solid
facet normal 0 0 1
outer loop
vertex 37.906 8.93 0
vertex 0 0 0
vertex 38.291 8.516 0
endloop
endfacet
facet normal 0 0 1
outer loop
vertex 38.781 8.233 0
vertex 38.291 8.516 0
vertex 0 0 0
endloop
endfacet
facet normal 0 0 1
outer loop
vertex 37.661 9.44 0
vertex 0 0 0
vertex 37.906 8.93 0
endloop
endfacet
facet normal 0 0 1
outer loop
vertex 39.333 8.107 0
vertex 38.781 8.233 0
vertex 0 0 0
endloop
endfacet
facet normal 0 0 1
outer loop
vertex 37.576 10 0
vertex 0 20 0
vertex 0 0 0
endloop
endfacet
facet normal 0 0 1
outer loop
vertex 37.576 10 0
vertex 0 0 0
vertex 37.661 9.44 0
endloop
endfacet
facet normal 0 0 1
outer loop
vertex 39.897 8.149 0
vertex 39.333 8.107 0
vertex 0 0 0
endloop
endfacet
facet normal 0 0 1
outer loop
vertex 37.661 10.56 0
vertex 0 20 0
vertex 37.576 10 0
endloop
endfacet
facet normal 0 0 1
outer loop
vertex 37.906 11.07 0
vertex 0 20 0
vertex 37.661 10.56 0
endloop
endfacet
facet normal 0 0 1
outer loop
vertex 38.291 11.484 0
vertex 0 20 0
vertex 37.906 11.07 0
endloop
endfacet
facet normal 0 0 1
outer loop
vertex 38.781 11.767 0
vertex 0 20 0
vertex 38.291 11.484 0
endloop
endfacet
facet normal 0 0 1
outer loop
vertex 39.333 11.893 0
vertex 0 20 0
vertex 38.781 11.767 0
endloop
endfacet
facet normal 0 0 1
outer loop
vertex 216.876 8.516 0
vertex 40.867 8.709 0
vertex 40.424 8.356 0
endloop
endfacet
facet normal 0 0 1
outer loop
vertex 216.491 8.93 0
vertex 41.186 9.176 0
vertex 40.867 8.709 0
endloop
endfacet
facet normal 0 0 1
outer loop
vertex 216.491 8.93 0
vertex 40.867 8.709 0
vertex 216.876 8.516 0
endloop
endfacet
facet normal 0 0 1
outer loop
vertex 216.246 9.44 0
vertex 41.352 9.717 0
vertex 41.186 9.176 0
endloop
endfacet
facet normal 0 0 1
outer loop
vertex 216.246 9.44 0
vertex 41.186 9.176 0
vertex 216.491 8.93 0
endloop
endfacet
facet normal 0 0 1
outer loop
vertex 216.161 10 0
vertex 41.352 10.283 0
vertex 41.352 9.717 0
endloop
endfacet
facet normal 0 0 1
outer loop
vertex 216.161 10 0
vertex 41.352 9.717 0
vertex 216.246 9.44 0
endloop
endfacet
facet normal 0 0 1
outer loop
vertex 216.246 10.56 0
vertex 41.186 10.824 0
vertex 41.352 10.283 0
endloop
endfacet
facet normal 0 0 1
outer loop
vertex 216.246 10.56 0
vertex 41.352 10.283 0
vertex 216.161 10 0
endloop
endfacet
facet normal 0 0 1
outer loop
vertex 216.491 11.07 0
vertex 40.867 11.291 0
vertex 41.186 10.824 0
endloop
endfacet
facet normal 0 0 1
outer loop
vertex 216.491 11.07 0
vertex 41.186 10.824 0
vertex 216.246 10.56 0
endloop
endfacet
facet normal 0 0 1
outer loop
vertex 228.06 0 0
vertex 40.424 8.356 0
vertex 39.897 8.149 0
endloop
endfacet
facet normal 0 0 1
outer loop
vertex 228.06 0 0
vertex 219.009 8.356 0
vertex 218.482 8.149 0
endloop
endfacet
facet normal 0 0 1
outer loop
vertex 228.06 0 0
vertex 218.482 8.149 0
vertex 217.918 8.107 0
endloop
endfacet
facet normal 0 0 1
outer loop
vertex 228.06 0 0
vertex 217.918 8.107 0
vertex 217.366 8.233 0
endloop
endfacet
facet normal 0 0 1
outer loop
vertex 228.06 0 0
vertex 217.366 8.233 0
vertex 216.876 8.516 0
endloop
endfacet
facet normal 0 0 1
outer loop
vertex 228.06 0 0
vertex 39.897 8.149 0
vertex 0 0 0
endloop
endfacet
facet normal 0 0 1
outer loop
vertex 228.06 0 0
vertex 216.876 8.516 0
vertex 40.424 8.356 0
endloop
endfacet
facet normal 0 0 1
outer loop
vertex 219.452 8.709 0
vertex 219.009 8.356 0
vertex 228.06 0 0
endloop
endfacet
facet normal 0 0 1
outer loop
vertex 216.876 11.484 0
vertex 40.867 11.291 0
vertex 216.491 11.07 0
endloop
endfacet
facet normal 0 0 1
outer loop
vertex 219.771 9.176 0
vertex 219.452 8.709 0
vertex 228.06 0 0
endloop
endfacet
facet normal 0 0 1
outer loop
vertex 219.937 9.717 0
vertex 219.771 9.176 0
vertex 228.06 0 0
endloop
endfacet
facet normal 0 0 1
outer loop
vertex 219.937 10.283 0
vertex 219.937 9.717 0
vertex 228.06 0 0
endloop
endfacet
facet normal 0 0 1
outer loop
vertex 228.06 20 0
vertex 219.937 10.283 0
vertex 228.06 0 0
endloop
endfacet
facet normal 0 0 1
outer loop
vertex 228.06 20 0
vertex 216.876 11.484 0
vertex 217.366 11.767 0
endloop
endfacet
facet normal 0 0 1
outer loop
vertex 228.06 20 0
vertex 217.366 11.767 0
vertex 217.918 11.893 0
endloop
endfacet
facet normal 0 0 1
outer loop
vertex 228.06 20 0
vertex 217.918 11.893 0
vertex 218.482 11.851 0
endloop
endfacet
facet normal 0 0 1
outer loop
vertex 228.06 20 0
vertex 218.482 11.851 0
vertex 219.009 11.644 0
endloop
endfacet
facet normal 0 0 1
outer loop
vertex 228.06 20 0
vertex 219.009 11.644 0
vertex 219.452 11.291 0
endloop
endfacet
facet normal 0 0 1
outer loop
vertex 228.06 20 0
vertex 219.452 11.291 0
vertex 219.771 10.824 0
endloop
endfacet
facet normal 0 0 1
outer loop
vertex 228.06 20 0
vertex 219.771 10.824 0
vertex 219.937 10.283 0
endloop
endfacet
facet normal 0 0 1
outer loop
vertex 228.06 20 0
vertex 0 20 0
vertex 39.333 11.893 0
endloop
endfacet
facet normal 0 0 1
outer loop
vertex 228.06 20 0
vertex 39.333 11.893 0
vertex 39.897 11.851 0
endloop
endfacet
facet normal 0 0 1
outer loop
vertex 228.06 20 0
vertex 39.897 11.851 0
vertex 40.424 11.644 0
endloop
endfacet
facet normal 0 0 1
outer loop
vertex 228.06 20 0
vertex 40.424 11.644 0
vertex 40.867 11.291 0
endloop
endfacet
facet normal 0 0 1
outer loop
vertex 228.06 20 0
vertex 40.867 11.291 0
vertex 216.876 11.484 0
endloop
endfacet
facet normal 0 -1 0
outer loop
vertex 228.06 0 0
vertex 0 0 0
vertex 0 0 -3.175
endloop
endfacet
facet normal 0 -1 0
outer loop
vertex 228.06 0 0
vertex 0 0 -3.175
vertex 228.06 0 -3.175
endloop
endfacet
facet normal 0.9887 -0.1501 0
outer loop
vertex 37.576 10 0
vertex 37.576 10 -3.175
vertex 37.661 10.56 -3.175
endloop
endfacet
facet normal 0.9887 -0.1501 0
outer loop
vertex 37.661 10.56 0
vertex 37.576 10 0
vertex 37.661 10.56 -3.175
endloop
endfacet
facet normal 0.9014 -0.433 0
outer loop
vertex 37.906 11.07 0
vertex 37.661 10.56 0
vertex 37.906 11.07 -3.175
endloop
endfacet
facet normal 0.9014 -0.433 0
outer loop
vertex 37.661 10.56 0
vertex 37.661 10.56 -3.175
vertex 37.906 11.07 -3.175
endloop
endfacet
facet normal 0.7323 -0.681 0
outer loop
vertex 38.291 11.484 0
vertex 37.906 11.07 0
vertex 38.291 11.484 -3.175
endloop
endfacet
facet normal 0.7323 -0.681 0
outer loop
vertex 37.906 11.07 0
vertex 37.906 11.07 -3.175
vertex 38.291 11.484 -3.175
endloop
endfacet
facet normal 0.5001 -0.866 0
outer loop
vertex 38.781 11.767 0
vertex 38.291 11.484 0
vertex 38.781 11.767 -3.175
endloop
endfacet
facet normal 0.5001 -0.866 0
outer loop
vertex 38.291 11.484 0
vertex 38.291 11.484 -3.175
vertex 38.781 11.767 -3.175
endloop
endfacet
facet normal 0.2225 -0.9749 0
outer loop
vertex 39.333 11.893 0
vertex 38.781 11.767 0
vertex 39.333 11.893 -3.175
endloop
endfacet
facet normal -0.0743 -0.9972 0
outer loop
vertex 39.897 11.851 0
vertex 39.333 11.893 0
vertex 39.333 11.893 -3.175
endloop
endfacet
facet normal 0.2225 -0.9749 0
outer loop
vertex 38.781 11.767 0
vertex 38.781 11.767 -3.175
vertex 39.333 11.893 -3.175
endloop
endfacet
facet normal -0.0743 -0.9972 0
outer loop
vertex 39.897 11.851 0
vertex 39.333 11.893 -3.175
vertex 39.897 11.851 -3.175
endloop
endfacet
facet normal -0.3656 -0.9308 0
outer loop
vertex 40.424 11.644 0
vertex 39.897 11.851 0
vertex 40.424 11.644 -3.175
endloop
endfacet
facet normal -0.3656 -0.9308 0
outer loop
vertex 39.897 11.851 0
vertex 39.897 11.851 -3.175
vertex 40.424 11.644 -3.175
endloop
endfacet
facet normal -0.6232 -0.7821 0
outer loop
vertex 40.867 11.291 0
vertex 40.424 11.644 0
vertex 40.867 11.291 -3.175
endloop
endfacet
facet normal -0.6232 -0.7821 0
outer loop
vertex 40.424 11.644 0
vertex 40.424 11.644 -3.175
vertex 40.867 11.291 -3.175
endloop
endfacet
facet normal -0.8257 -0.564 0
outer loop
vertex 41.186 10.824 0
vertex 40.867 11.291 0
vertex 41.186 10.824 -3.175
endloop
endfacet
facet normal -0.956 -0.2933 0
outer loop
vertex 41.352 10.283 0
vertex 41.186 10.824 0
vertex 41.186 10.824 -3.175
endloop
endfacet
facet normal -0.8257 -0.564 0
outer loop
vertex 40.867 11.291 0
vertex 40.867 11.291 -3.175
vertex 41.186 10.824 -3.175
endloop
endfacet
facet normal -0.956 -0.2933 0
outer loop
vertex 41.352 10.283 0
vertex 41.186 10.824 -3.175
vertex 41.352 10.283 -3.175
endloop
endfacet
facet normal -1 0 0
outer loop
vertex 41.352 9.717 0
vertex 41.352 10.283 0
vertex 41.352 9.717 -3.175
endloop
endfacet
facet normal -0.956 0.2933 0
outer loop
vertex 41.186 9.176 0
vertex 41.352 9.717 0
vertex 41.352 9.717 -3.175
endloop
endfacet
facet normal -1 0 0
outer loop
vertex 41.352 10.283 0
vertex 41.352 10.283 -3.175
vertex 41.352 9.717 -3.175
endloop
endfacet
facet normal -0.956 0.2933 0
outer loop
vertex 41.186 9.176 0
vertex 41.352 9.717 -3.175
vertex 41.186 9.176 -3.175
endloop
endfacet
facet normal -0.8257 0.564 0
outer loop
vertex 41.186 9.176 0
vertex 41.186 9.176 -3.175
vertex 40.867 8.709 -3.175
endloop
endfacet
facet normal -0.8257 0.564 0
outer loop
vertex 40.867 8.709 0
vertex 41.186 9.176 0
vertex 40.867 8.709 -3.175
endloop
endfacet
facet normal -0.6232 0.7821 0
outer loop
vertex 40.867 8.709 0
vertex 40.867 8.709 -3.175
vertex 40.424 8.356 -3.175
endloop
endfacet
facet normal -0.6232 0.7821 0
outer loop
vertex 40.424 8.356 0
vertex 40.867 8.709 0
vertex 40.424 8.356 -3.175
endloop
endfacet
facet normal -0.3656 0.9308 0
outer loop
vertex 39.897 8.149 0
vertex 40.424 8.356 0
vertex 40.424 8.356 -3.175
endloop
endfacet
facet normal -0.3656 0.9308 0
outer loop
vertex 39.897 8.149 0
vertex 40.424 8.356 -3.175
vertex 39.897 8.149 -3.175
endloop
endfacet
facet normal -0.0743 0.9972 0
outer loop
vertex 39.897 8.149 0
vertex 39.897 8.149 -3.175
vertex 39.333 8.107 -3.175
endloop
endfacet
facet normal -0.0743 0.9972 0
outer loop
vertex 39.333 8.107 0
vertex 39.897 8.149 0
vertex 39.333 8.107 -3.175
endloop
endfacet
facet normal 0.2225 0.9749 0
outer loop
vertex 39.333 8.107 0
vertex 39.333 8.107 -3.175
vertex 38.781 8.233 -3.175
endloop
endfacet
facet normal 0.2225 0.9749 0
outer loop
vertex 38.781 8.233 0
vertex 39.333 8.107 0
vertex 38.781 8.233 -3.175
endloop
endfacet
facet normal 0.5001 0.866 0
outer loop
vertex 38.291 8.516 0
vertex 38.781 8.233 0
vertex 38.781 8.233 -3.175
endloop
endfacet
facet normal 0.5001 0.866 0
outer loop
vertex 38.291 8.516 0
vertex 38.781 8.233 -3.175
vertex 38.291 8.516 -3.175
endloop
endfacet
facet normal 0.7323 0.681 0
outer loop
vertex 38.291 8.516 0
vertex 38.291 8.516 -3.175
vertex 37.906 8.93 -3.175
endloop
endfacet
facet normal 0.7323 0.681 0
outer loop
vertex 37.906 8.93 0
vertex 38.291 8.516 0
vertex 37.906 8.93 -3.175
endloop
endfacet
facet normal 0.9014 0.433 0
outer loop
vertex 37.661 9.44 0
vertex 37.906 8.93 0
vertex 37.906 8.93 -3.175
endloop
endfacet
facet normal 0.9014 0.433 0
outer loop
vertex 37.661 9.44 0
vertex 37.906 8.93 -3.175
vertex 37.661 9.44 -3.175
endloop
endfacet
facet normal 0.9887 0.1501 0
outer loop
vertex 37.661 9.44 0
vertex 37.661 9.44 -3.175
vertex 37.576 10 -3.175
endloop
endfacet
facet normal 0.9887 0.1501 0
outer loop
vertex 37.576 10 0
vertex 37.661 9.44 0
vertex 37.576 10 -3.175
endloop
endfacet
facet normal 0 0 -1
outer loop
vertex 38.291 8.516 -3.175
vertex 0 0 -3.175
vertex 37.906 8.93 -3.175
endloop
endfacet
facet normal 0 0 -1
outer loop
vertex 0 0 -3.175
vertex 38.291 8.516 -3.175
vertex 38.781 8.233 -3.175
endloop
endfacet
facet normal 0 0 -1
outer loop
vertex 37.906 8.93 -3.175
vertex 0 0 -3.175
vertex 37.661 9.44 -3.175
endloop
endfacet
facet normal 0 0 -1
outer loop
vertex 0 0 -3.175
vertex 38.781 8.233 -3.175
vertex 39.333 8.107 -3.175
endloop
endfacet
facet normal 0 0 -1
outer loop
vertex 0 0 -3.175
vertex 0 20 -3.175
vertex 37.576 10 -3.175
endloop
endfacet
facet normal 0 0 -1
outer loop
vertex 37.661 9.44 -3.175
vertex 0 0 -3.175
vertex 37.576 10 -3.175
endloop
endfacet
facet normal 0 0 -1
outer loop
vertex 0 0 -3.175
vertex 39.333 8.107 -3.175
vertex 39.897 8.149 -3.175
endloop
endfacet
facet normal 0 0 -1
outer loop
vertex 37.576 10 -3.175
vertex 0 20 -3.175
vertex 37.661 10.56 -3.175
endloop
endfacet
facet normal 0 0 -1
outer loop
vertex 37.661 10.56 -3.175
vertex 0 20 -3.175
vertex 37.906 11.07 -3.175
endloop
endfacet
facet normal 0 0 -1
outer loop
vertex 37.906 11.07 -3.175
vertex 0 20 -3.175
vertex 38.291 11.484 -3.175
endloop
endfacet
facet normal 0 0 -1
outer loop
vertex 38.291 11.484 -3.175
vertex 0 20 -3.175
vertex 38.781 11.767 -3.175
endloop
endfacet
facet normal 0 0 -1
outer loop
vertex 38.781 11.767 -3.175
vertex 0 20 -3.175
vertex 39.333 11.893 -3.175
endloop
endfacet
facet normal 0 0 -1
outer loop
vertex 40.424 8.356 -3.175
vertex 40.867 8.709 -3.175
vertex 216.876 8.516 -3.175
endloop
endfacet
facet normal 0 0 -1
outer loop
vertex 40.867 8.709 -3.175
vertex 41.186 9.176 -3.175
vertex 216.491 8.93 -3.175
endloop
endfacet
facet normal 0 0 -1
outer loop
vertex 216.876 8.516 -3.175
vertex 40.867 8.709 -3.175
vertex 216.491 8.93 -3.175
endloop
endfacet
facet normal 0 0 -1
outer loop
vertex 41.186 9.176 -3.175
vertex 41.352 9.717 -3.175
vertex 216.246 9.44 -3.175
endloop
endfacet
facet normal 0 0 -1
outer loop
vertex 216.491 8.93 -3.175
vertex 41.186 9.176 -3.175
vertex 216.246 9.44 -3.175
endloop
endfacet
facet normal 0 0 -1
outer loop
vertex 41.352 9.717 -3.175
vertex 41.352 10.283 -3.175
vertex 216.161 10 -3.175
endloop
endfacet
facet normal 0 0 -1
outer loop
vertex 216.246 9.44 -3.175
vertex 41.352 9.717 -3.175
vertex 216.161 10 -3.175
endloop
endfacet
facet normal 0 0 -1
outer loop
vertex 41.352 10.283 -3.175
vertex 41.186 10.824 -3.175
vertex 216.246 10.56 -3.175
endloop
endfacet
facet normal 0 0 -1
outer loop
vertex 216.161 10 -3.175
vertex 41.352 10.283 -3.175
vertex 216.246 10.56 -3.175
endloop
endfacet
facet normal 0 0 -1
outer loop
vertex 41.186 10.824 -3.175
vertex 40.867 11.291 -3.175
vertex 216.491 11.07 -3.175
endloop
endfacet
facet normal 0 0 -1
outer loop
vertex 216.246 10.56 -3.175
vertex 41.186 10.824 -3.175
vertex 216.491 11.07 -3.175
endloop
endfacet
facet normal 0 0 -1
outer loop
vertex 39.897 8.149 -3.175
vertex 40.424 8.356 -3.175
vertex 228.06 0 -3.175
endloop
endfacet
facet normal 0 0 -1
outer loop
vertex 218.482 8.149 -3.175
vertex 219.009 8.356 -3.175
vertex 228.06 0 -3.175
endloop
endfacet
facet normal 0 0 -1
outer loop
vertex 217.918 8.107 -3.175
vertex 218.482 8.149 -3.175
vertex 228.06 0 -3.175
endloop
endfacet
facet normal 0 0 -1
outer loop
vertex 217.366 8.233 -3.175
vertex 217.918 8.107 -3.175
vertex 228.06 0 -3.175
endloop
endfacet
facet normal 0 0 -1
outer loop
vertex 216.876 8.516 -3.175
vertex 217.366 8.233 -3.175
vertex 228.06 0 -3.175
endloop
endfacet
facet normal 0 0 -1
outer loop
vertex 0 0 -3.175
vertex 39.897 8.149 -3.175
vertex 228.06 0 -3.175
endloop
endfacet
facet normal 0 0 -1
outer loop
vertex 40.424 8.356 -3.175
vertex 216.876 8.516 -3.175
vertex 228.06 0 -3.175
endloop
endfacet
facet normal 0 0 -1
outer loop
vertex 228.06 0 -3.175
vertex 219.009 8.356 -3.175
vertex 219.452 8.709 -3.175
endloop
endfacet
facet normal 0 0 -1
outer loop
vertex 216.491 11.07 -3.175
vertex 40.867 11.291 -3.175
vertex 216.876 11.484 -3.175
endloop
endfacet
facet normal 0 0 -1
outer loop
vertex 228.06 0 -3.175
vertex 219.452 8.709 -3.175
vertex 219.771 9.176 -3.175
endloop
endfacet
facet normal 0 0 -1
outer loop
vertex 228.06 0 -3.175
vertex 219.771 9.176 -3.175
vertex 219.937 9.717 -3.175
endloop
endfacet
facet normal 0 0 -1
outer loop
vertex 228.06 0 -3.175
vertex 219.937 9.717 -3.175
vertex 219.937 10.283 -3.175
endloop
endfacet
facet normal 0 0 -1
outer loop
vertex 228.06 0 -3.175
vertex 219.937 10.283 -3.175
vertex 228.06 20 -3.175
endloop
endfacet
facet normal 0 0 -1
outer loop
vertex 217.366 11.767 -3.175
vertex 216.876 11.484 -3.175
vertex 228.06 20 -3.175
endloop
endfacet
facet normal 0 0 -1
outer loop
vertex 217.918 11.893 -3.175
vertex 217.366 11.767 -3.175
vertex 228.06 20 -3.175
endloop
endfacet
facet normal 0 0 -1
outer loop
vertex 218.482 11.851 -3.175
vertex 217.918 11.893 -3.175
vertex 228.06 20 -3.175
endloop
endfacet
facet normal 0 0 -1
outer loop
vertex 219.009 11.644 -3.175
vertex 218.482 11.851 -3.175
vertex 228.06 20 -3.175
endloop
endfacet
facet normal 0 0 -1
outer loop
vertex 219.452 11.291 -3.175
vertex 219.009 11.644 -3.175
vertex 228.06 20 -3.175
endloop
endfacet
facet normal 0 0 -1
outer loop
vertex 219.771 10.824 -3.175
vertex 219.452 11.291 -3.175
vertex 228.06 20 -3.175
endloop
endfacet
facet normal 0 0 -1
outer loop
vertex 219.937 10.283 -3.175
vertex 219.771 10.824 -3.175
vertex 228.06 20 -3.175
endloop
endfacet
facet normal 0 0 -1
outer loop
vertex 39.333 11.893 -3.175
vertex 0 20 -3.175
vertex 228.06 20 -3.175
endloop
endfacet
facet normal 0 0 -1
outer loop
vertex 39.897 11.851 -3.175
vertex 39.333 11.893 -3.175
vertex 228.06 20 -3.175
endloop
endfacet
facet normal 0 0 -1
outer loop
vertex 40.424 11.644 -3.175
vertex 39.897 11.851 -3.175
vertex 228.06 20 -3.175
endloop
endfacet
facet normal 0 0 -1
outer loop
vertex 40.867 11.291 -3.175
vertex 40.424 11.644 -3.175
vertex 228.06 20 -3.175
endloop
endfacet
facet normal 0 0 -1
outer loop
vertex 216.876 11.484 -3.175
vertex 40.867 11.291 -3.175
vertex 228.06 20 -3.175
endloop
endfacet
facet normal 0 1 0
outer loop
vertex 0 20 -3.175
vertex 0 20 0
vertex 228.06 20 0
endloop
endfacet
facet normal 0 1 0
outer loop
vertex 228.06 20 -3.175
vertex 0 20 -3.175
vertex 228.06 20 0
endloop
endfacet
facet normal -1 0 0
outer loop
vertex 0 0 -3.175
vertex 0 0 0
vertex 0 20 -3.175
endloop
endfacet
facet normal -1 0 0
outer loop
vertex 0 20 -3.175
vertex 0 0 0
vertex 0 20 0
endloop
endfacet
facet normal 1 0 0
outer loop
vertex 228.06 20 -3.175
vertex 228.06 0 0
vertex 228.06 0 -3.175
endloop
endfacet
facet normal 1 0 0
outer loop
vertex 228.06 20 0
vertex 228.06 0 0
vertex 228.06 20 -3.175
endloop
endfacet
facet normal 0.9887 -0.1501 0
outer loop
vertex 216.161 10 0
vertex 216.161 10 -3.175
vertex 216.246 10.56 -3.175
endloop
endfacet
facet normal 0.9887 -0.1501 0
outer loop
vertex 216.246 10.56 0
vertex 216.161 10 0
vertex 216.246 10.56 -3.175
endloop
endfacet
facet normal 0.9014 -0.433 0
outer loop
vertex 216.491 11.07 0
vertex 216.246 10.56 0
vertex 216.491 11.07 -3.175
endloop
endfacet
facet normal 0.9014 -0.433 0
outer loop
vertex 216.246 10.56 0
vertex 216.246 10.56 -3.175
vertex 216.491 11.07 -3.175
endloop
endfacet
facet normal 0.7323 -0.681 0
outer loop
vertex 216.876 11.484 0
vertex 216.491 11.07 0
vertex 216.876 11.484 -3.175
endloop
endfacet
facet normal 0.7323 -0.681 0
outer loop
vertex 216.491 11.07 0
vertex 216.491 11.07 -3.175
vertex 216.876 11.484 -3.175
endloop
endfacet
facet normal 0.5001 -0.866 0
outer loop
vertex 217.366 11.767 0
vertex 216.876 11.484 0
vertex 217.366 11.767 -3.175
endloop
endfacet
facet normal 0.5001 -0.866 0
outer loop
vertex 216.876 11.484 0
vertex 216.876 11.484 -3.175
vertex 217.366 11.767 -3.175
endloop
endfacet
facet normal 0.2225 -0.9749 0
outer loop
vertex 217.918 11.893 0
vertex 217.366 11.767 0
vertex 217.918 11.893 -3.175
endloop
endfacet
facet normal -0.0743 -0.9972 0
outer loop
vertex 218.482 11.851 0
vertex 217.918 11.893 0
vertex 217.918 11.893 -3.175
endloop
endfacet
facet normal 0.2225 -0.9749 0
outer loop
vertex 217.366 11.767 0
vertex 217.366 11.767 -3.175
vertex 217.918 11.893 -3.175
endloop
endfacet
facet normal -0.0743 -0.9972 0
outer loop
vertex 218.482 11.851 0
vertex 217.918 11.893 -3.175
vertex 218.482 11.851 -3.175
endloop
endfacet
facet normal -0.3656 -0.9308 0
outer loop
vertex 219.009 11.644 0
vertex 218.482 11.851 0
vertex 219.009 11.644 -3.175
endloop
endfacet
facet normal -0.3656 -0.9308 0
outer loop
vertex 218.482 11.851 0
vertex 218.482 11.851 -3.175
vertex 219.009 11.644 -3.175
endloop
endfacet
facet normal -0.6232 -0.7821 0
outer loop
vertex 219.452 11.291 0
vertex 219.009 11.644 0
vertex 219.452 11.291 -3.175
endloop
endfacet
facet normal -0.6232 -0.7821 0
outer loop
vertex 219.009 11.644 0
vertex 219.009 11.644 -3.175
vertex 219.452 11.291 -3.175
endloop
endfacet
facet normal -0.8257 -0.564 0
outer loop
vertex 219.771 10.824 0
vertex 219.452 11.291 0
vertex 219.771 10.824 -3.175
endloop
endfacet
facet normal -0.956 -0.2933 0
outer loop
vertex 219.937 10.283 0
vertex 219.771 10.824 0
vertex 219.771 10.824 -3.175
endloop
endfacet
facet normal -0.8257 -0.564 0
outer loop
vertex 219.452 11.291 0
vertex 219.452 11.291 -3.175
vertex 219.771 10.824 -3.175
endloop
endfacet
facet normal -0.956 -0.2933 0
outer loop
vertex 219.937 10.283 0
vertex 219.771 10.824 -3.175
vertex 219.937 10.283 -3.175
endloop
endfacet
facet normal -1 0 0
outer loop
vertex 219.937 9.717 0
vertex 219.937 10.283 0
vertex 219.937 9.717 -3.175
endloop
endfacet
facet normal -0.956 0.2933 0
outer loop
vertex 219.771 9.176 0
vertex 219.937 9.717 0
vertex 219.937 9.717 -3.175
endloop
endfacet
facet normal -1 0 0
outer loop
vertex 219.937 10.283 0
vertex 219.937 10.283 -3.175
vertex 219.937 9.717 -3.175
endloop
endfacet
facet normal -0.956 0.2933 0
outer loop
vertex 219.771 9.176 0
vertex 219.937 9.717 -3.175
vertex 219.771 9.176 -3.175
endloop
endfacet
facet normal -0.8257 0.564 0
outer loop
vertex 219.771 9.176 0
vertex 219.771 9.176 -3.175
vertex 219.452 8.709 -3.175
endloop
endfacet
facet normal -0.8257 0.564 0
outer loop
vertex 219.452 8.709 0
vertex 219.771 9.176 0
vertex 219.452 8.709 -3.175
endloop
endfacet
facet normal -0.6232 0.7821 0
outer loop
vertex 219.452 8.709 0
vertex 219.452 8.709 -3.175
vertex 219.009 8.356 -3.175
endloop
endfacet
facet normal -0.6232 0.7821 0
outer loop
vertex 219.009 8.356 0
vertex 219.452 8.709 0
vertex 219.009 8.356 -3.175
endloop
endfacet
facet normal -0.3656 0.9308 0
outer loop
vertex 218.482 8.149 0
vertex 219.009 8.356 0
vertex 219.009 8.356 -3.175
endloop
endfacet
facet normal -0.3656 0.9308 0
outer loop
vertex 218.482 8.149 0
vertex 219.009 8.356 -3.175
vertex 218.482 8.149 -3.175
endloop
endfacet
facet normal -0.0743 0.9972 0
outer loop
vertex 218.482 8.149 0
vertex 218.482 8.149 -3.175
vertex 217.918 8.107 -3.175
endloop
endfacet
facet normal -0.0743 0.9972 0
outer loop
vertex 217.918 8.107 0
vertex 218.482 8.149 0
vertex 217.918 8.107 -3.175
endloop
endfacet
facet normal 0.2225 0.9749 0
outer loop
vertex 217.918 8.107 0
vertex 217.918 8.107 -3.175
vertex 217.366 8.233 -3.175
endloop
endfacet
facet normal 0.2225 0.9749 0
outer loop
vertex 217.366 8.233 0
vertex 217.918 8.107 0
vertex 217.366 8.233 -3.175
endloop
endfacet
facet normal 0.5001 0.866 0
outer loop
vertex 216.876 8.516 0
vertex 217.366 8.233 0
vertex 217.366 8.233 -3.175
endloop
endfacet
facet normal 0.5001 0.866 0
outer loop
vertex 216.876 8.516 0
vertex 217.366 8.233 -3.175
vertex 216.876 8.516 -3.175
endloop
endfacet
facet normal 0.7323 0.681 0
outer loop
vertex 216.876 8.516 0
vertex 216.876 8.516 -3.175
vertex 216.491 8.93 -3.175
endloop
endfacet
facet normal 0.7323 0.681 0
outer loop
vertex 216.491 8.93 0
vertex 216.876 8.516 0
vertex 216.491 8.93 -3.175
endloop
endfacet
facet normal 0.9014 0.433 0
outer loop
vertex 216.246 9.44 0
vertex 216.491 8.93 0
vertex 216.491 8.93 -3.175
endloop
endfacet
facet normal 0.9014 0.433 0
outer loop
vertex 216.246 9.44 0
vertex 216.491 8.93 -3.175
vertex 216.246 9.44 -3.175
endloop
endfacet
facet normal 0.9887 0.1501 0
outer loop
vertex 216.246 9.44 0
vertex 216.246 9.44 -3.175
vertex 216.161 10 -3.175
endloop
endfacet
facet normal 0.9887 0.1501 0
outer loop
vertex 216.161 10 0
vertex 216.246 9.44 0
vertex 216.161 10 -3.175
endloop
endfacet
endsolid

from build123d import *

# Parameters (mm, degrees)
SKETCH2_W             = 228.06
SKETCH2_H             = 20
BOSS_EXTRUDE1_DEPTH   = 3.175
F_6_CLEARANCE_HOLE1_D = 3.7973


with BuildPart() as part:
    # Sketch2 → Boss-Extrude1 (new body)
    with BuildSketch(Plane.XY):
        with Locations((114.03, 10)):
            Rectangle(SKETCH2_W, SKETCH2_H)
    extrude(amount=-BOSS_EXTRUDE1_DEPTH)

    # #6 Clearance Hole1 (through all)
    with Locations(Plane.XY):
        with Locations((218.06, 10), (39.475, 10)):
            Hole(F_6_CLEARANCE_HOLE1_D / 2)


solid = part.part
